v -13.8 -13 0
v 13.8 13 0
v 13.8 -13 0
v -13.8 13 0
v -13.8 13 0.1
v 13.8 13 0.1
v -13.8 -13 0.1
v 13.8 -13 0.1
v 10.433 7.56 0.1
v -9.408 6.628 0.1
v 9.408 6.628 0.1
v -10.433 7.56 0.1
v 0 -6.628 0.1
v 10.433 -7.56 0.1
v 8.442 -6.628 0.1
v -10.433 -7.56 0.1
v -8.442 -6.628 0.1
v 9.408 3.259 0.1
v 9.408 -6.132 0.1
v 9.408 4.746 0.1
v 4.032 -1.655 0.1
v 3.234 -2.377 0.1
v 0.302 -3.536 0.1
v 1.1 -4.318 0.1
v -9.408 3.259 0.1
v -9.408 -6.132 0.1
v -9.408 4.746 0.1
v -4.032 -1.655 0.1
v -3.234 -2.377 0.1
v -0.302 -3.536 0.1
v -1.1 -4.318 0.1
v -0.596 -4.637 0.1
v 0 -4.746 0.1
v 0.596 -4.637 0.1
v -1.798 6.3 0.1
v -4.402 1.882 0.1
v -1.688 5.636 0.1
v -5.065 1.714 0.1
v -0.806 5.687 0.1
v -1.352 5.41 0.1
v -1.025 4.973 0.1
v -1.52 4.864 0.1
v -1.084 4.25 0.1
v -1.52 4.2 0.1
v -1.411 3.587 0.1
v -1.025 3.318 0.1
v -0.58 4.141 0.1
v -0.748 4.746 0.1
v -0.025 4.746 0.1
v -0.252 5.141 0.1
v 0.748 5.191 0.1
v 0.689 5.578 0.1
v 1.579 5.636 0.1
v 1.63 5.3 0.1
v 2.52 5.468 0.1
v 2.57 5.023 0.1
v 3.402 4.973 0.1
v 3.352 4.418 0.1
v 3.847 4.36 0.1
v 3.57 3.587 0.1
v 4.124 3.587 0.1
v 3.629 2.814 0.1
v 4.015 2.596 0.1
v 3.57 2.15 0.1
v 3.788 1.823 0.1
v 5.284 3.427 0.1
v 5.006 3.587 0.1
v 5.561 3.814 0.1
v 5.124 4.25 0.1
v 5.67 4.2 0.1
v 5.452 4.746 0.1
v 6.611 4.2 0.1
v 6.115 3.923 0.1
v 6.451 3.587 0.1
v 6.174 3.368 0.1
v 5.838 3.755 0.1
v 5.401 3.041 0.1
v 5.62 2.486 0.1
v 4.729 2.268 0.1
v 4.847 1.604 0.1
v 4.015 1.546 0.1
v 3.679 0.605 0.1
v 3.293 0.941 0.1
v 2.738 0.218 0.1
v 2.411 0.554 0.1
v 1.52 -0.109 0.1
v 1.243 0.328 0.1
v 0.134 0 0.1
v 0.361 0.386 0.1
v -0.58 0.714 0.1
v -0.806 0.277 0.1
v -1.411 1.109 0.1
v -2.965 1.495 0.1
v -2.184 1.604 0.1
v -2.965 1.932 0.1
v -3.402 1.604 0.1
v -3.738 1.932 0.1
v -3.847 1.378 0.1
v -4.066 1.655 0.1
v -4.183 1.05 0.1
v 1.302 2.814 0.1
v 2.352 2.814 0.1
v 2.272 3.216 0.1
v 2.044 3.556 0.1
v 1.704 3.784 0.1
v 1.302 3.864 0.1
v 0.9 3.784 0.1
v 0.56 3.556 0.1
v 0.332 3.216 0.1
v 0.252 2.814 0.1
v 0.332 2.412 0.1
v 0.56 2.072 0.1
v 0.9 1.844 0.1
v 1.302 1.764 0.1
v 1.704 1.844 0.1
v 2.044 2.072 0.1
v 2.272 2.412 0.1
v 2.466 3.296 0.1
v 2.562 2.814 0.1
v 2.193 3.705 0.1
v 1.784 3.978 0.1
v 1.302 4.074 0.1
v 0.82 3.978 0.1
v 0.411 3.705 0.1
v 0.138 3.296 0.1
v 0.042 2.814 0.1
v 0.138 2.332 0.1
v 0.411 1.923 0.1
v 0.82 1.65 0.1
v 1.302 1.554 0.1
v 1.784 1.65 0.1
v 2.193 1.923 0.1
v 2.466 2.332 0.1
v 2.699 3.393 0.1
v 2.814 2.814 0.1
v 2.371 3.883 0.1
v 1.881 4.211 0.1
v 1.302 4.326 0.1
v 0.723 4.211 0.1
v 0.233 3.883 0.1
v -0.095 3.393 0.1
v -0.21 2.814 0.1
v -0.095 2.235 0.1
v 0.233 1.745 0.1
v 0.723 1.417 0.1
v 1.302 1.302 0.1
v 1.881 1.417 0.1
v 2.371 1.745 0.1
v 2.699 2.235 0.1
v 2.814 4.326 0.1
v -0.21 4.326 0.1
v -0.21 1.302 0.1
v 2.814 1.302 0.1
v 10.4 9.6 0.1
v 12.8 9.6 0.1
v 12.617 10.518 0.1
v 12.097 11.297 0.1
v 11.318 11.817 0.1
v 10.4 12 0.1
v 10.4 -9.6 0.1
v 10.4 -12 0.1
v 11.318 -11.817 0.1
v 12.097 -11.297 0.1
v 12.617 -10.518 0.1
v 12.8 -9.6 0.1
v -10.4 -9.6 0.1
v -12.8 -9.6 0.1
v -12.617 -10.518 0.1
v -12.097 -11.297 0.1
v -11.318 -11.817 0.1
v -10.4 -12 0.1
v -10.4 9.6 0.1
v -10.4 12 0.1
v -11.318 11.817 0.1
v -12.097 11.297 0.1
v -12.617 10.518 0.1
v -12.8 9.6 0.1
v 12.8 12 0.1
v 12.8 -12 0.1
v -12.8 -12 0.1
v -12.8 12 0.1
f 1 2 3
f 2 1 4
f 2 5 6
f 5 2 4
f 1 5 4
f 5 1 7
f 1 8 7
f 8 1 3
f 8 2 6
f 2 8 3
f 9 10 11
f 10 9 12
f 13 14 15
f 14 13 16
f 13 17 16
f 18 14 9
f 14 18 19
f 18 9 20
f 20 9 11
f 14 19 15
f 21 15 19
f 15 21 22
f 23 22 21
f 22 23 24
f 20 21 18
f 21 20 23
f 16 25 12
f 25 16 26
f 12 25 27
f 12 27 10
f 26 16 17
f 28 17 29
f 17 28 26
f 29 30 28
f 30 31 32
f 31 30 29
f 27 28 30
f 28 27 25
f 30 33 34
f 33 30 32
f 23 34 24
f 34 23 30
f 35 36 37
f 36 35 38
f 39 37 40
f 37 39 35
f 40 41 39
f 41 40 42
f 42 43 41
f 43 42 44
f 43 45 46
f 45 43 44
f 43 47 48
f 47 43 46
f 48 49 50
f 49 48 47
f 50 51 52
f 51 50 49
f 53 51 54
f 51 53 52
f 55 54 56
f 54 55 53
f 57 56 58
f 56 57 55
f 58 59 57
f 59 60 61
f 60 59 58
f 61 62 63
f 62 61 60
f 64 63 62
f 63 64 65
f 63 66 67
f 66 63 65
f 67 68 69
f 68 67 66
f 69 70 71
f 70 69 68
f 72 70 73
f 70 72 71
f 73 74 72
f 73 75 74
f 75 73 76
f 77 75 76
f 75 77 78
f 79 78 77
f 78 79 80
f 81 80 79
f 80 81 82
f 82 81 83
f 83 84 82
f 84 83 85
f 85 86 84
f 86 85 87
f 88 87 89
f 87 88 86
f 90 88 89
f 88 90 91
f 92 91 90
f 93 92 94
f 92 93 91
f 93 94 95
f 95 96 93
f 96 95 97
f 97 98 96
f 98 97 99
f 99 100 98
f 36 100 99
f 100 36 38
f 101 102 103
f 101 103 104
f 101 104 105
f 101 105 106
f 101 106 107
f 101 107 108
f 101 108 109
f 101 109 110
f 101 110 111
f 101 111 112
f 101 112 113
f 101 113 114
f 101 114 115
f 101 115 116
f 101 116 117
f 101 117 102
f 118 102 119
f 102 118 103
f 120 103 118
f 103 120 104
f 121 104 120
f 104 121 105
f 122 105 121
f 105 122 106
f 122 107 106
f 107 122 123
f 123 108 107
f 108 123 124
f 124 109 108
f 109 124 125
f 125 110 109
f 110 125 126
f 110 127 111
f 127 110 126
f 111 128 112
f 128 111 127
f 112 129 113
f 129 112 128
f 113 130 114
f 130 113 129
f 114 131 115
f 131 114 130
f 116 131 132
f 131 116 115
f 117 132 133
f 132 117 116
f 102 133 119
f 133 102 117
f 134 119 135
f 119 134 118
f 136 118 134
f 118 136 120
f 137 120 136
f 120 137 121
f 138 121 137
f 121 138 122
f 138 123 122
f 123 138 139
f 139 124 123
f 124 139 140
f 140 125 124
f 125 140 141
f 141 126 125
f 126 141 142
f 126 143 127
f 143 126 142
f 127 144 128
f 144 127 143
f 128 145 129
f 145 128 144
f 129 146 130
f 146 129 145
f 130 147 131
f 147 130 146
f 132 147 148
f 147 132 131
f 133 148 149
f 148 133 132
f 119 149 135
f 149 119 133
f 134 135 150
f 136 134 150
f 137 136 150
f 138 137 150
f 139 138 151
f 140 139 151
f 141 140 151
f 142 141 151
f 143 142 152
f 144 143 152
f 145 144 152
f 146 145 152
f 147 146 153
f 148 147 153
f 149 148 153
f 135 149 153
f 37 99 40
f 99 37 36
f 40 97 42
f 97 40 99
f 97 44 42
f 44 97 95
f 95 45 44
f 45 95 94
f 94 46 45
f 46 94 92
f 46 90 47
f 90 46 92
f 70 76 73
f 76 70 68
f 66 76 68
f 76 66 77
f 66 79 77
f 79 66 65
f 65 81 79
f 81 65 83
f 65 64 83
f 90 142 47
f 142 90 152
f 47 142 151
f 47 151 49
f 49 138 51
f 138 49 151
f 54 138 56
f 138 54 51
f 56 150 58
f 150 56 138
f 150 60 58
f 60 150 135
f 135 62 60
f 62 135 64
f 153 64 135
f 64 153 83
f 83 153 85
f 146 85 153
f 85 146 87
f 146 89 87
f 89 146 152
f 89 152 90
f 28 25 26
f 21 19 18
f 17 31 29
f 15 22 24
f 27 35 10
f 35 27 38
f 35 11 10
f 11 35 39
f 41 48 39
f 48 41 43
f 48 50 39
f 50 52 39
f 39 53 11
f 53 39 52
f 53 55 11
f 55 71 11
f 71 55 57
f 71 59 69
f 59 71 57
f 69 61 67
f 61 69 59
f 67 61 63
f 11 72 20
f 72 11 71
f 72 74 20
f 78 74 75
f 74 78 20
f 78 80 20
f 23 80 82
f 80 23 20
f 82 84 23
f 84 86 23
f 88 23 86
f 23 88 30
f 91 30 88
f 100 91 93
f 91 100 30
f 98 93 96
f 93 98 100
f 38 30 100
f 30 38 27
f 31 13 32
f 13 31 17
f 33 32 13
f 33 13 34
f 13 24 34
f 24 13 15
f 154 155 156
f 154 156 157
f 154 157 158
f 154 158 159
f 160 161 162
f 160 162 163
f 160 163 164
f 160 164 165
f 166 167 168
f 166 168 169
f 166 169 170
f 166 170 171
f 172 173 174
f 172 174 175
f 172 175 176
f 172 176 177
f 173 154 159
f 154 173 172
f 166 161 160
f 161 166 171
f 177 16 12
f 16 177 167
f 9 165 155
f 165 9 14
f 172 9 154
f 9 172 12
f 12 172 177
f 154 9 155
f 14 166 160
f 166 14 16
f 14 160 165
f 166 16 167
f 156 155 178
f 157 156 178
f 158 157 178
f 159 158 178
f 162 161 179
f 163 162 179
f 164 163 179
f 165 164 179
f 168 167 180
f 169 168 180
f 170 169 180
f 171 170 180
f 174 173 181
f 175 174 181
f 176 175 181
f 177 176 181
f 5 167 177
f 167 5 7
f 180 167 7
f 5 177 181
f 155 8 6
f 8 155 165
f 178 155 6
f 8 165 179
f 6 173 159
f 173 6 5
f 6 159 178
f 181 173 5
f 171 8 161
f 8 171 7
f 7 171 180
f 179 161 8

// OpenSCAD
// file: ../p/4-4ring5.scad
use <../lib.scad>
function ldraw_lib__4_4ring5() = [
// 0 Ring  5 x 1.0
// 0 Name: 4-4ring5.dat
// 0 Author: Mark Kennedy [mkennedy]
// 0 !LDRAW_ORG Primitive UPDATE 2012-01
// 0 !LICENSE Licensed under CC BY 4.0 : see CAreadme.txt
// 
// 0 BFC CERTIFY CCW
  [0,"BFC","CERTIFY"],
  [0,"BFC","CCW"],
// 
// 0 !HISTORY 2001-10-23 [pneaster] resequenced quads, corrected winding.
// 0 !HISTORY 2001-12-29 [pneaster] Added BFC.
// 0 !HISTORY 2002-04-25 [PTadmin] Official Update 2002-02
// 0 !HISTORY 2007-06-24 [PTadmin] Header formatted for Contributor Agreement
// 0 !HISTORY 2008-07-01 [PTadmin] Official Update 2008-01
// 0 !HISTORY 2012-02-16 [Philo] Changed to CCW
// 0 !HISTORY 2012-03-30 [PTadmin] Official Update 2012-01
// 
// 
// 4 16 6 0 0 5.5433 0 2.2961 4.6195 0 1.9135 5 0 0
  [4,16,6,0,0,5.5433,0,2.2961,4.6195,0,1.9135,5,0,0],
// 4 16 5.5433 0 2.2961 4.2426 0 4.2426 3.5355 0 3.5355 4.6195 0 1.9135
  [4,16,5.5433,0,2.2961,4.2426,0,4.2426,3.5355,0,3.5355,4.6195,0,1.9135],
// 4 16 4.2426 0 4.2426 2.2961 0 5.5433 1.9135 0 4.6195 3.5355 0 3.5355
  [4,16,4.2426,0,4.2426,2.2961,0,5.5433,1.9135,0,4.6195,3.5355,0,3.5355],
// 4 16 2.2961 0 5.5433 0 0 6 0 0 5 1.9135 0 4.6195
  [4,16,2.2961,0,5.5433,0,0,6,0,0,5,1.9135,0,4.6195],
// 4 16 0 0 6 -2.2961 0 5.5433 -1.9135 0 4.6195 0 0 5
  [4,16,0,0,6,-2.2961,0,5.5433,-1.9135,0,4.6195,0,0,5],
// 4 16 -2.2961 0 5.5433 -4.2426 0 4.2426 -3.5355 0 3.5355 -1.9135 0 4.6195
  [4,16,-2.2961,0,5.5433,-4.2426,0,4.2426,-3.5355,0,3.5355,-1.9135,0,4.6195],
// 4 16 -4.2426 0 4.2426 -5.5433 0 2.2961 -4.6195 0 1.9135 -3.5355 0 3.5355
  [4,16,-4.2426,0,4.2426,-5.5433,0,2.2961,-4.6195,0,1.9135,-3.5355,0,3.5355],
// 4 16 -5.5433 0 2.2961 -6 0 0 -5 0 0 -4.6195 0 1.9135
  [4,16,-5.5433,0,2.2961,-6,0,0,-5,0,0,-4.6195,0,1.9135],
// 4 16 -6 0 0 -5.5433 0 -2.2961 -4.6195 0 -1.9135 -5 0 0
  [4,16,-6,0,0,-5.5433,0,-2.2961,-4.6195,0,-1.9135,-5,0,0],
// 4 16 -5.5433 0 -2.2961 -4.2426 0 -4.2426 -3.5355 0 -3.5355 -4.6195 0 -1.9135
  [4,16,-5.5433,0,-2.2961,-4.2426,0,-4.2426,-3.5355,0,-3.5355,-4.6195,0,-1.9135],
// 4 16 -4.2426 0 -4.2426 -2.2961 0 -5.5433 -1.9135 0 -4.6195 -3.5355 0 -3.5355
  [4,16,-4.2426,0,-4.2426,-2.2961,0,-5.5433,-1.9135,0,-4.6195,-3.5355,0,-3.5355],
// 4 16 -2.2961 0 -5.5433 0 0 -6 0 0 -5 -1.9135 0 -4.6195
  [4,16,-2.2961,0,-5.5433,0,0,-6,0,0,-5,-1.9135,0,-4.6195],
// 4 16 0 0 -6 2.2961 0 -5.5433 1.9135 0 -4.6195 0 0 -5
  [4,16,0,0,-6,2.2961,0,-5.5433,1.9135,0,-4.6195,0,0,-5],
// 4 16 2.2961 0 -5.5433 4.2426 0 -4.2426 3.5355 0 -3.5355 1.9135 0 -4.6195
  [4,16,2.2961,0,-5.5433,4.2426,0,-4.2426,3.5355,0,-3.5355,1.9135,0,-4.6195],
// 4 16 4.2426 0 -4.2426 5.5433 0 -2.2961 4.6195 0 -1.9135 3.5355 0 -3.5355
  [4,16,4.2426,0,-4.2426,5.5433,0,-2.2961,4.6195,0,-1.9135,3.5355,0,-3.5355],
// 4 16 5.5433 0 -2.2961 6 0 0 5 0 0 4.6195 0 -1.9135
  [4,16,5.5433,0,-2.2961,6,0,0,5,0,0,4.6195,0,-1.9135],
];
module ldraw_lib__4_4ring5(step=0, col=false, unit=2/5, alt=false, line=0.2, solid=!$preview)
    makepoly(ldraw_lib__4_4ring5(), step=step, col=col, unit=unit, alt=alt, line=line, solid=solid);
ldraw_lib__4_4ring5(line=0.2);
// file: ../p/4-4ndis.scad
use <../lib.scad>
function ldraw_lib__4_4ndis() = [
// 0 Disc Negative 1.0
// 0 Name: 4-4ndis.dat
// 0 Author: James Jessiman
// 0 !LDRAW_ORG Primitive UPDATE 2012-01
// 0 !LICENSE Licensed under CC BY 4.0 : see CAreadme.txt
// 
// 0 BFC CERTIFY CCW
  [0,"BFC","CERTIFY"],
  [0,"BFC","CCW"],
// 
// 0 !HISTORY 2002-03-23 [sbliss] Added BFC statement; compacted code
// 0 !HISTORY 2002-04-25 [PTadmin] Official Update 2002-02
// 0 !HISTORY 2007-06-24 [PTadmin] Header formatted for Contributor Agreement
// 0 !HISTORY 2008-07-01 [PTadmin] Official Update 2008-01
// 0 !HISTORY 2012-02-16 [Philo] Changed to CCW
// 0 !HISTORY 2012-03-30 [PTadmin] Official Update 2012-01
// 
// 
// 3 16 0.9239 0 0.3827 1 0 0 1 0 1
  [3,16,0.9239,0,0.3827,1,0,0,1,0,1],
// 3 16 0.7071 0 0.7071 0.9239 0 0.3827 1 0 1
  [3,16,0.7071,0,0.7071,0.9239,0,0.3827,1,0,1],
// 3 16 0.3827 0 0.9239 0.7071 0 0.7071 1 0 1
  [3,16,0.3827,0,0.9239,0.7071,0,0.7071,1,0,1],
// 3 16 0 0 1 0.3827 0 0.9239 1 0 1
  [3,16,0,0,1,0.3827,0,0.9239,1,0,1],
// 3 16 -0.3827 0 0.9239 0 0 1 -1 0 1
  [3,16,-0.3827,0,0.9239,0,0,1,-1,0,1],
// 3 16 -0.7071 0 0.7071 -0.3827 0 0.9239 -1 0 1
  [3,16,-0.7071,0,0.7071,-0.3827,0,0.9239,-1,0,1],
// 3 16 -0.9239 0 0.3827 -0.7071 0 0.7071 -1 0 1
  [3,16,-0.9239,0,0.3827,-0.7071,0,0.7071,-1,0,1],
// 3 16 -1 0 0 -0.9239 0 0.3827 -1 0 1
  [3,16,-1,0,0,-0.9239,0,0.3827,-1,0,1],
// 3 16 -0.9239 0 -0.3827 -1 0 0 -1 0 -1
  [3,16,-0.9239,0,-0.3827,-1,0,0,-1,0,-1],
// 3 16 -0.7071 0 -0.7071 -0.9239 0 -0.3827 -1 0 -1
  [3,16,-0.7071,0,-0.7071,-0.9239,0,-0.3827,-1,0,-1],
// 3 16 -0.3827 0 -0.9239 -0.7071 0 -0.7071 -1 0 -1
  [3,16,-0.3827,0,-0.9239,-0.7071,0,-0.7071,-1,0,-1],
// 3 16 0 0 -1 -0.3827 0 -0.9239 -1 0 -1
  [3,16,0,0,-1,-0.3827,0,-0.9239,-1,0,-1],
// 3 16 0.3827 0 -0.9239 0 0 -1 1 0 -1
  [3,16,0.3827,0,-0.9239,0,0,-1,1,0,-1],
// 3 16 0.7071 0 -0.7071 0.3827 0 -0.9239 1 0 -1
  [3,16,0.7071,0,-0.7071,0.3827,0,-0.9239,1,0,-1],
// 3 16 0.9239 0 -0.3827 0.7071 0 -0.7071 1 0 -1
  [3,16,0.9239,0,-0.3827,0.7071,0,-0.7071,1,0,-1],
// 3 16 1 0 0 0.9239 0 -0.3827 1 0 -1
  [3,16,1,0,0,0.9239,0,-0.3827,1,0,-1],
];
module ldraw_lib__4_4ndis(step=0, col=false, unit=2/5, alt=false, line=0.2, solid=!$preview)
    makepoly(ldraw_lib__4_4ndis(), step=step, col=col, unit=unit, alt=alt, line=line, solid=solid);
ldraw_lib__4_4ndis(line=0.2);
// file: ../p/4-4disc.scad
use <../lib.scad>
function ldraw_lib__4_4disc() = [
// 0 Disc 1.0
// 0 Name: 4-4disc.dat
// 0 Author: James Jessiman
// 0 !LDRAW_ORG Primitive UPDATE 2002-02
// 0 !LICENSE Licensed under CC BY 4.0 : see CAreadme.txt
// 
// 0 BFC CERTIFY CCW
  [0,"BFC","CERTIFY"],
  [0,"BFC","CCW"],
// 
// 0 !HISTORY 1998-12-15 [PTadmin] Official Update 1998-10
// 0 !HISTORY 2002-03-23 [sbliss] Added BFC statement
// 0 !HISTORY 2002-04-25 [PTadmin] Official Update 2002-02
// 0 !HISTORY 2007-06-24 [PTadmin] Header formatted for Contributor Agreement
// 0 !HISTORY 2008-07-01 [PTadmin] Official Update 2008-01
// 
// 
// 3 16 0 0 0 1 0 0 0.9239 0 0.3827
  [3,16,0,0,0,1,0,0,0.9239,0,0.3827],
// 3 16 0 0 0 0.9239 0 0.3827 0.7071 0 0.7071
  [3,16,0,0,0,0.9239,0,0.3827,0.7071,0,0.7071],
// 3 16 0 0 0 0.7071 0 0.7071 0.3827 0 0.9239
  [3,16,0,0,0,0.7071,0,0.7071,0.3827,0,0.9239],
// 3 16 0 0 0 0.3827 0 0.9239 0 0 1
  [3,16,0,0,0,0.3827,0,0.9239,0,0,1],
// 3 16 0 0 0 0 0 1 -0.3827 0 0.9239
  [3,16,0,0,0,0,0,1,-0.3827,0,0.9239],
// 3 16 0 0 0 -0.3827 0 0.9239 -0.7071 0 0.7071
  [3,16,0,0,0,-0.3827,0,0.9239,-0.7071,0,0.7071],
// 3 16 0 0 0 -0.7071 0 0.7071 -0.9239 0 0.3827
  [3,16,0,0,0,-0.7071,0,0.7071,-0.9239,0,0.3827],
// 3 16 0 0 0 -0.9239 0 0.3827 -1 0 -0
  [3,16,0,0,0,-0.9239,0,0.3827,-1,0,-0],
// 3 16 0 0 0 -1 0 -0 -0.9239 0 -0.3827
  [3,16,0,0,0,-1,0,-0,-0.9239,0,-0.3827],
// 3 16 0 0 0 -0.9239 0 -0.3827 -0.7071 0 -0.7071
  [3,16,0,0,0,-0.9239,0,-0.3827,-0.7071,0,-0.7071],
// 3 16 0 0 0 -0.7071 0 -0.7071 -0.3827 0 -0.9239
  [3,16,0,0,0,-0.7071,0,-0.7071,-0.3827,0,-0.9239],
// 3 16 0 0 0 -0.3827 0 -0.9239 0 0 -1
  [3,16,0,0,0,-0.3827,0,-0.9239,0,0,-1],
// 3 16 0 0 0 0 0 -1 0.3827 0 -0.9239
  [3,16,0,0,0,0,0,-1,0.3827,0,-0.9239],
// 3 16 0 0 0 0.3827 0 -0.9239 0.7071 0 -0.7071
  [3,16,0,0,0,0.3827,0,-0.9239,0.7071,0,-0.7071],
// 3 16 0 0 0 0.7071 0 -0.7071 0.9239 0 -0.3827
  [3,16,0,0,0,0.7071,0,-0.7071,0.9239,0,-0.3827],
// 3 16 0 0 0 0.9239 0 -0.3827 1 0 0
  [3,16,0,0,0,0.9239,0,-0.3827,1,0,0],
// 0
];
module ldraw_lib__4_4disc(step=0, col=false, unit=2/5, alt=false, line=0.2, solid=!$preview)
    makepoly(ldraw_lib__4_4disc(), step=step, col=col, unit=unit, alt=alt, line=line, solid=solid);
ldraw_lib__4_4disc(line=0.2);
// file: ../p/box5-12.scad
use <../lib.scad>
function ldraw_lib__box5_12() = [
// 0 Box with 5 Faces without Any Edges
// 0 Name: box5-12.dat
// 0 Author: Chris Dee [cwdee]
// 0 !LDRAW_ORG Primitive UPDATE 2009-02
// 0 !LICENSE Licensed under CC BY 4.0 : see CAreadme.txt
// 
// 0 BFC CERTIFY CCW
  [0,"BFC","CERTIFY"],
  [0,"BFC","CCW"],
// 
// 0 !HISTORY 2009-09-03 [PTadmin] Official Update 2009-02
// 
// 
// 4 16 1 1 1 1 1 -1 -1 1 -1 -1 1 1
  [4,16,1,1,1,1,1,-1,-1,1,-1,-1,1,1],
// 4 16 -1 0 1 1 0 1 1 1 1 -1 1 1
  [4,16,-1,0,1,1,0,1,1,1,1,-1,1,1],
// 4 16 -1 0 -1 -1 0 1 -1 1 1 -1 1 -1
  [4,16,-1,0,-1,-1,0,1,-1,1,1,-1,1,-1],
// 4 16 1 0 -1 -1 0 -1 -1 1 -1 1 1 -1
  [4,16,1,0,-1,-1,0,-1,-1,1,-1,1,1,-1],
// 4 16 1 0 1 1 0 -1 1 1 -1 1 1 1
  [4,16,1,0,1,1,0,-1,1,1,-1,1,1,1],
// 0
];
module ldraw_lib__box5_12(step=0, col=false, unit=2/5, alt=false, line=0.2, solid=!$preview)
    makepoly(ldraw_lib__box5_12(), step=step, col=col, unit=unit, alt=alt, line=line, solid=solid);
ldraw_lib__box5_12(line=0.2);
// file: ../p/1-4ndis.scad
use <../lib.scad>
function ldraw_lib__1_4ndis() = [
// 0 Disc Negative 0.25
// 0 Name: 1-4ndis.dat
// 0 Author: James Jessiman
// 0 !LDRAW_ORG Primitive UPDATE 2012-01
// 0 !LICENSE Licensed under CC BY 4.0 : see CAreadme.txt
// 
// 0 BFC CERTIFY CCW
  [0,"BFC","CERTIFY"],
  [0,"BFC","CCW"],
// 
// 0 !HISTORY 2002-03-23 [sbliss] Added BFC Statement
// 0 !HISTORY 2002-04-25 [PTadmin] Official Update 2002-02
// 0 !HISTORY 2007-06-22 [PTadmin] Header formatted for Contributor Agreement
// 0 !HISTORY 2008-07-01 [PTadmin] Official Update 2008-01
// 0 !HISTORY 2012-02-16 [Philo] Changed to CCW
// 0 !HISTORY 2012-03-30 [PTadmin] Official Update 2012-01
// 
// 
// 3 16 0.9239 0 0.3827 1 0 0 1 0 1
  [3,16,0.9239,0,0.3827,1,0,0,1,0,1],
// 3 16 0.7071 0 0.7071 0.9239 0 0.3827 1 0 1
  [3,16,0.7071,0,0.7071,0.9239,0,0.3827,1,0,1],
// 3 16 0.3827 0 0.9239 0.7071 0 0.7071 1 0 1
  [3,16,0.3827,0,0.9239,0.7071,0,0.7071,1,0,1],
// 3 16 0 0 1 0.3827 0 0.9239 1 0 1
  [3,16,0,0,1,0.3827,0,0.9239,1,0,1],
];
module ldraw_lib__1_4ndis(step=0, col=false, unit=2/5, alt=false, line=0.2, solid=!$preview)
    makepoly(ldraw_lib__1_4ndis(), step=step, col=col, unit=unit, alt=alt, line=line, solid=solid);
ldraw_lib__1_4ndis(line=0.2);
// file: ../p/1-4disc.scad
use <../lib.scad>
function ldraw_lib__1_4disc() = [
// 0 Disc 0.25
// 0 Name: 1-4disc.dat
// 0 Author: James Jessiman
// 0 !LDRAW_ORG Primitive UPDATE 2002-02
// 0 !LICENSE Licensed under CC BY 4.0 : see CAreadme.txt
// 
// 0 BFC CERTIFY CCW
  [0,"BFC","CERTIFY"],
  [0,"BFC","CCW"],
// 
// 0 !HISTORY 2002-03-23 [sbliss] Added BFC statement.
// 0 !HISTORY 2002-04-25 [PTadmin] Official Update 2002-02
// 0 !HISTORY 2007-06-22 [PTadmin] Header formatted for Contributor Agreement
// 0 !HISTORY 2008-07-01 [PTadmin] Official Update 2008-01
// 
// 
// 3 16 0 0 0 1 0 0 0.9239 0 0.3827
  [3,16,0,0,0,1,0,0,0.9239,0,0.3827],
// 3 16 0 0 0 0.9239 0 0.3827 0.7071 0 0.7071
  [3,16,0,0,0,0.9239,0,0.3827,0.7071,0,0.7071],
// 3 16 0 0 0 0.7071 0 0.7071 0.3827 0 0.9239
  [3,16,0,0,0,0.7071,0,0.7071,0.3827,0,0.9239],
// 3 16 0 0 0 0.3827 0 0.9239 0 0 1
  [3,16,0,0,0,0.3827,0,0.9239,0,0,1],
// 0
];
module ldraw_lib__1_4disc(step=0, col=false, unit=2/5, alt=false, line=0.2, solid=!$preview)
    makepoly(ldraw_lib__1_4disc(), step=step, col=col, unit=unit, alt=alt, line=line, solid=solid);
ldraw_lib__1_4disc(line=0.2);
// main file
use <../lib.scad>
use <../p/1-4disc.scad>
use <../p/1-4ndis.scad>
use <../p/box5-12.scad>
use <s/4346p03b.scad>
function ldraw_lib__194215a() = [
// 0 Sticker  3.3 x  3.5 with Mail Logo
// 0 Name: 194215a.dat
// 0 Author: Chris Dee [cwdee]
// 0 !LDRAW_ORG Part UPDATE 2022-02
// 0 !LICENSE Licensed under CC BY 4.0 : see CAreadme.txt
// 
// 0 BFC CERTIFY CW
  [0,"BFC","CERTIFY"],
  [0,"BFC","CW"],
// 
// 0 !KEYWORDS Mail truck, Set 6651
// 
// 0 !HISTORY 2011-12-29 [PTadmin] Official Update 2011-02
// 0 !HISTORY 2021-08-20 [RainbowDolphin] Followed latest BFC specs for transparent stickers
// 0 !HISTORY 2022-03-06 [PTadmin] Official Update 2022-02
// 
// 
// 1 16 0 -0.25 0 34.5 0 0 0 0.25 0 0 0 32.5 box5-12.dat
  [1,16,0,-0.25,0,34.5,0,0,0,0.25,0,0,0,32.5, ldraw_lib__box5_12()],
// 0 BFC NOCLIP
  [0,"BFC","NOCLIP"],
// 1 16 0 -0.25 0 2.1 0 0 0 1 0 0 0 2.1 s\4346p03b.dat
  [1,16,0,-0.25,0,2.1,0,0,0,1,0,0,0,2.1, ldraw_lib__s__4346p03b()],
// 1 4 26 -0.25 24 6 0 0 0 1 0 0 0 6 1-4disc.dat
  [1,4,26,-0.25,24,6,0,0,0,1,0,0,0,6, ldraw_lib__1_4disc()],
// 1 4 26 -0.25 -24 0 0 6 0 1 0 -6 0 0 1-4disc.dat
  [1,4,26,-0.25,-24,0,0,6,0,1,0,-6,0,0, ldraw_lib__1_4disc()],
// 1 4 -26 -0.25 -24 -6 0 0 0 1 0 0 0 -6 1-4disc.dat
  [1,4,-26,-0.25,-24,-6,0,0,0,1,0,0,0,-6, ldraw_lib__1_4disc()],
// 1 4 -26 -0.25 24 0 0 -6 0 1 0 6 0 0 1-4disc.dat
  [1,4,-26,-0.25,24,0,0,-6,0,1,0,6,0,0, ldraw_lib__1_4disc()],
// 4 4 -26 -0.25 24 -26 -0.25 30 26 -0.25 30 26 -0.25 24
  [4,4,-26,-0.25,24,-26,-0.25,30,26,-0.25,30,26,-0.25,24],
// 4 4 -26 -0.25 -30 -26 -0.25 -24 26 -0.25 -24 26 -0.25 -30
  [4,4,-26,-0.25,-30,-26,-0.25,-24,26,-0.25,-24,26,-0.25,-30],
// 4 4 -32 -0.25 24 -26.082 -0.25 18.9 -26.082 -0.25 -18.9 -32 -0.25 -24
  [4,4,-32,-0.25,24,-26.082,-0.25,18.9,-26.082,-0.25,-18.9,-32,-0.25,-24],
// 4 4 32 -0.25 -24 26.082 -0.25 -18.9 26.082 -0.25 18.9 32 -0.25 24
  [4,4,32,-0.25,-24,26.082,-0.25,-18.9,26.082,-0.25,18.9,32,-0.25,24],
// 4 4 -26 -0.25 24 26 -0.25 24 26.082 -0.25 18.9 -26.082 -0.25 18.9
  [4,4,-26,-0.25,24,26,-0.25,24,26.082,-0.25,18.9,-26.082,-0.25,18.9],
// 3 4 -32 -0.25 24 -26 -0.25 24 -26.082 -0.25 18.9
  [3,4,-32,-0.25,24,-26,-0.25,24,-26.082,-0.25,18.9],
// 3 4 32 -0.25 24 26.082 -0.25 18.9 26 -0.25 24
  [3,4,32,-0.25,24,26.082,-0.25,18.9,26,-0.25,24],
// 4 4 26 -0.25 -24 -26 -0.25 -24 -26.082 -0.25 -18.9 26.082 -0.25 -18.9
  [4,4,26,-0.25,-24,-26,-0.25,-24,-26.082,-0.25,-18.9,26.082,-0.25,-18.9],
// 3 4 32 -0.25 -24 26 -0.25 -24 26.082 -0.25 -18.9
  [3,4,32,-0.25,-24,26,-0.25,-24,26.082,-0.25,-18.9],
// 3 4 -32 -0.25 -24 -26.082 -0.25 -18.9 -26 -0.25 -24
  [3,4,-32,-0.25,-24,-26.082,-0.25,-18.9,-26,-0.25,-24],
// 0 BFC CLIP
  [0,"BFC","CLIP"],
// 1 16 26 -0.25 24 6 0 0 0 1 0 0 0 6 1-4ndis.dat
  [1,16,26,-0.25,24,6,0,0,0,1,0,0,0,6, ldraw_lib__1_4ndis()],
// 1 16 26 -0.25 -24 0 0 6 0 1 0 -6 0 0 1-4ndis.dat
  [1,16,26,-0.25,-24,0,0,6,0,1,0,-6,0,0, ldraw_lib__1_4ndis()],
// 1 16 -26 -0.25 -24 -6 0 0 0 1 0 0 0 -6 1-4ndis.dat
  [1,16,-26,-0.25,-24,-6,0,0,0,1,0,0,0,-6, ldraw_lib__1_4ndis()],
// 1 16 -26 -0.25 24 0 0 -6 0 1 0 6 0 0 1-4ndis.dat
  [1,16,-26,-0.25,24,0,0,-6,0,1,0,6,0,0, ldraw_lib__1_4ndis()],
// 4 16 -34.5 -0.25 32.5 -32 -0.25 24 -32 -0.25 -24 -34.5 -0.25 -32.5
  [4,16,-34.5,-0.25,32.5,-32,-0.25,24,-32,-0.25,-24,-34.5,-0.25,-32.5],
// 3 16 -34.5 -0.25 -32.5 -32 -0.25 -24 -32 -0.25 -30
  [3,16,-34.5,-0.25,-32.5,-32,-0.25,-24,-32,-0.25,-30],
// 3 16 -32 -0.25 30 -32 -0.25 24 -34.5 -0.25 32.5
  [3,16,-32,-0.25,30,-32,-0.25,24,-34.5,-0.25,32.5],
// 4 16 34.5 -0.25 -32.5 32 -0.25 -24 32 -0.25 24 34.5 -0.25 32.5
  [4,16,34.5,-0.25,-32.5,32,-0.25,-24,32,-0.25,24,34.5,-0.25,32.5],
// 3 16 34.5 -0.25 32.5 32 -0.25 24 32 -0.25 30
  [3,16,34.5,-0.25,32.5,32,-0.25,24,32,-0.25,30],
// 3 16 32 -0.25 -30 32 -0.25 -24 34.5 -0.25 -32.5
  [3,16,32,-0.25,-30,32,-0.25,-24,34.5,-0.25,-32.5],
// 4 16 -34.5 -0.25 32.5 34.5 -0.25 32.5 26 -0.25 30 -26 -0.25 30
  [4,16,-34.5,-0.25,32.5,34.5,-0.25,32.5,26,-0.25,30,-26,-0.25,30],
// 3 16 32 -0.25 30 26 -0.25 30 34.5 -0.25 32.5
  [3,16,32,-0.25,30,26,-0.25,30,34.5,-0.25,32.5],
// 3 16 -34.5 -0.25 32.5 -26 -0.25 30 -32 -0.25 30
  [3,16,-34.5,-0.25,32.5,-26,-0.25,30,-32,-0.25,30],
// 4 16 34.5 -0.25 -32.5 -34.5 -0.25 -32.5 -26 -0.25 -30 26 -0.25 -30
  [4,16,34.5,-0.25,-32.5,-34.5,-0.25,-32.5,-26,-0.25,-30,26,-0.25,-30],
// 3 16 -32 -0.25 -30 -26 -0.25 -30 -34.5 -0.25 -32.5
  [3,16,-32,-0.25,-30,-26,-0.25,-30,-34.5,-0.25,-32.5],
// 3 16 34.5 -0.25 -32.5 26 -0.25 -30 32 -0.25 -30
  [3,16,34.5,-0.25,-32.5,26,-0.25,-30,32,-0.25,-30],
];
module ldraw_lib__194215a(step=0, col=false, unit=2/5, alt=false, line=0.2, solid=!$preview)
    makepoly(ldraw_lib__194215a(), step=step, col=col, unit=unit, alt=alt, line=line, solid=solid);
ldraw_lib__194215a(line=0.2);
